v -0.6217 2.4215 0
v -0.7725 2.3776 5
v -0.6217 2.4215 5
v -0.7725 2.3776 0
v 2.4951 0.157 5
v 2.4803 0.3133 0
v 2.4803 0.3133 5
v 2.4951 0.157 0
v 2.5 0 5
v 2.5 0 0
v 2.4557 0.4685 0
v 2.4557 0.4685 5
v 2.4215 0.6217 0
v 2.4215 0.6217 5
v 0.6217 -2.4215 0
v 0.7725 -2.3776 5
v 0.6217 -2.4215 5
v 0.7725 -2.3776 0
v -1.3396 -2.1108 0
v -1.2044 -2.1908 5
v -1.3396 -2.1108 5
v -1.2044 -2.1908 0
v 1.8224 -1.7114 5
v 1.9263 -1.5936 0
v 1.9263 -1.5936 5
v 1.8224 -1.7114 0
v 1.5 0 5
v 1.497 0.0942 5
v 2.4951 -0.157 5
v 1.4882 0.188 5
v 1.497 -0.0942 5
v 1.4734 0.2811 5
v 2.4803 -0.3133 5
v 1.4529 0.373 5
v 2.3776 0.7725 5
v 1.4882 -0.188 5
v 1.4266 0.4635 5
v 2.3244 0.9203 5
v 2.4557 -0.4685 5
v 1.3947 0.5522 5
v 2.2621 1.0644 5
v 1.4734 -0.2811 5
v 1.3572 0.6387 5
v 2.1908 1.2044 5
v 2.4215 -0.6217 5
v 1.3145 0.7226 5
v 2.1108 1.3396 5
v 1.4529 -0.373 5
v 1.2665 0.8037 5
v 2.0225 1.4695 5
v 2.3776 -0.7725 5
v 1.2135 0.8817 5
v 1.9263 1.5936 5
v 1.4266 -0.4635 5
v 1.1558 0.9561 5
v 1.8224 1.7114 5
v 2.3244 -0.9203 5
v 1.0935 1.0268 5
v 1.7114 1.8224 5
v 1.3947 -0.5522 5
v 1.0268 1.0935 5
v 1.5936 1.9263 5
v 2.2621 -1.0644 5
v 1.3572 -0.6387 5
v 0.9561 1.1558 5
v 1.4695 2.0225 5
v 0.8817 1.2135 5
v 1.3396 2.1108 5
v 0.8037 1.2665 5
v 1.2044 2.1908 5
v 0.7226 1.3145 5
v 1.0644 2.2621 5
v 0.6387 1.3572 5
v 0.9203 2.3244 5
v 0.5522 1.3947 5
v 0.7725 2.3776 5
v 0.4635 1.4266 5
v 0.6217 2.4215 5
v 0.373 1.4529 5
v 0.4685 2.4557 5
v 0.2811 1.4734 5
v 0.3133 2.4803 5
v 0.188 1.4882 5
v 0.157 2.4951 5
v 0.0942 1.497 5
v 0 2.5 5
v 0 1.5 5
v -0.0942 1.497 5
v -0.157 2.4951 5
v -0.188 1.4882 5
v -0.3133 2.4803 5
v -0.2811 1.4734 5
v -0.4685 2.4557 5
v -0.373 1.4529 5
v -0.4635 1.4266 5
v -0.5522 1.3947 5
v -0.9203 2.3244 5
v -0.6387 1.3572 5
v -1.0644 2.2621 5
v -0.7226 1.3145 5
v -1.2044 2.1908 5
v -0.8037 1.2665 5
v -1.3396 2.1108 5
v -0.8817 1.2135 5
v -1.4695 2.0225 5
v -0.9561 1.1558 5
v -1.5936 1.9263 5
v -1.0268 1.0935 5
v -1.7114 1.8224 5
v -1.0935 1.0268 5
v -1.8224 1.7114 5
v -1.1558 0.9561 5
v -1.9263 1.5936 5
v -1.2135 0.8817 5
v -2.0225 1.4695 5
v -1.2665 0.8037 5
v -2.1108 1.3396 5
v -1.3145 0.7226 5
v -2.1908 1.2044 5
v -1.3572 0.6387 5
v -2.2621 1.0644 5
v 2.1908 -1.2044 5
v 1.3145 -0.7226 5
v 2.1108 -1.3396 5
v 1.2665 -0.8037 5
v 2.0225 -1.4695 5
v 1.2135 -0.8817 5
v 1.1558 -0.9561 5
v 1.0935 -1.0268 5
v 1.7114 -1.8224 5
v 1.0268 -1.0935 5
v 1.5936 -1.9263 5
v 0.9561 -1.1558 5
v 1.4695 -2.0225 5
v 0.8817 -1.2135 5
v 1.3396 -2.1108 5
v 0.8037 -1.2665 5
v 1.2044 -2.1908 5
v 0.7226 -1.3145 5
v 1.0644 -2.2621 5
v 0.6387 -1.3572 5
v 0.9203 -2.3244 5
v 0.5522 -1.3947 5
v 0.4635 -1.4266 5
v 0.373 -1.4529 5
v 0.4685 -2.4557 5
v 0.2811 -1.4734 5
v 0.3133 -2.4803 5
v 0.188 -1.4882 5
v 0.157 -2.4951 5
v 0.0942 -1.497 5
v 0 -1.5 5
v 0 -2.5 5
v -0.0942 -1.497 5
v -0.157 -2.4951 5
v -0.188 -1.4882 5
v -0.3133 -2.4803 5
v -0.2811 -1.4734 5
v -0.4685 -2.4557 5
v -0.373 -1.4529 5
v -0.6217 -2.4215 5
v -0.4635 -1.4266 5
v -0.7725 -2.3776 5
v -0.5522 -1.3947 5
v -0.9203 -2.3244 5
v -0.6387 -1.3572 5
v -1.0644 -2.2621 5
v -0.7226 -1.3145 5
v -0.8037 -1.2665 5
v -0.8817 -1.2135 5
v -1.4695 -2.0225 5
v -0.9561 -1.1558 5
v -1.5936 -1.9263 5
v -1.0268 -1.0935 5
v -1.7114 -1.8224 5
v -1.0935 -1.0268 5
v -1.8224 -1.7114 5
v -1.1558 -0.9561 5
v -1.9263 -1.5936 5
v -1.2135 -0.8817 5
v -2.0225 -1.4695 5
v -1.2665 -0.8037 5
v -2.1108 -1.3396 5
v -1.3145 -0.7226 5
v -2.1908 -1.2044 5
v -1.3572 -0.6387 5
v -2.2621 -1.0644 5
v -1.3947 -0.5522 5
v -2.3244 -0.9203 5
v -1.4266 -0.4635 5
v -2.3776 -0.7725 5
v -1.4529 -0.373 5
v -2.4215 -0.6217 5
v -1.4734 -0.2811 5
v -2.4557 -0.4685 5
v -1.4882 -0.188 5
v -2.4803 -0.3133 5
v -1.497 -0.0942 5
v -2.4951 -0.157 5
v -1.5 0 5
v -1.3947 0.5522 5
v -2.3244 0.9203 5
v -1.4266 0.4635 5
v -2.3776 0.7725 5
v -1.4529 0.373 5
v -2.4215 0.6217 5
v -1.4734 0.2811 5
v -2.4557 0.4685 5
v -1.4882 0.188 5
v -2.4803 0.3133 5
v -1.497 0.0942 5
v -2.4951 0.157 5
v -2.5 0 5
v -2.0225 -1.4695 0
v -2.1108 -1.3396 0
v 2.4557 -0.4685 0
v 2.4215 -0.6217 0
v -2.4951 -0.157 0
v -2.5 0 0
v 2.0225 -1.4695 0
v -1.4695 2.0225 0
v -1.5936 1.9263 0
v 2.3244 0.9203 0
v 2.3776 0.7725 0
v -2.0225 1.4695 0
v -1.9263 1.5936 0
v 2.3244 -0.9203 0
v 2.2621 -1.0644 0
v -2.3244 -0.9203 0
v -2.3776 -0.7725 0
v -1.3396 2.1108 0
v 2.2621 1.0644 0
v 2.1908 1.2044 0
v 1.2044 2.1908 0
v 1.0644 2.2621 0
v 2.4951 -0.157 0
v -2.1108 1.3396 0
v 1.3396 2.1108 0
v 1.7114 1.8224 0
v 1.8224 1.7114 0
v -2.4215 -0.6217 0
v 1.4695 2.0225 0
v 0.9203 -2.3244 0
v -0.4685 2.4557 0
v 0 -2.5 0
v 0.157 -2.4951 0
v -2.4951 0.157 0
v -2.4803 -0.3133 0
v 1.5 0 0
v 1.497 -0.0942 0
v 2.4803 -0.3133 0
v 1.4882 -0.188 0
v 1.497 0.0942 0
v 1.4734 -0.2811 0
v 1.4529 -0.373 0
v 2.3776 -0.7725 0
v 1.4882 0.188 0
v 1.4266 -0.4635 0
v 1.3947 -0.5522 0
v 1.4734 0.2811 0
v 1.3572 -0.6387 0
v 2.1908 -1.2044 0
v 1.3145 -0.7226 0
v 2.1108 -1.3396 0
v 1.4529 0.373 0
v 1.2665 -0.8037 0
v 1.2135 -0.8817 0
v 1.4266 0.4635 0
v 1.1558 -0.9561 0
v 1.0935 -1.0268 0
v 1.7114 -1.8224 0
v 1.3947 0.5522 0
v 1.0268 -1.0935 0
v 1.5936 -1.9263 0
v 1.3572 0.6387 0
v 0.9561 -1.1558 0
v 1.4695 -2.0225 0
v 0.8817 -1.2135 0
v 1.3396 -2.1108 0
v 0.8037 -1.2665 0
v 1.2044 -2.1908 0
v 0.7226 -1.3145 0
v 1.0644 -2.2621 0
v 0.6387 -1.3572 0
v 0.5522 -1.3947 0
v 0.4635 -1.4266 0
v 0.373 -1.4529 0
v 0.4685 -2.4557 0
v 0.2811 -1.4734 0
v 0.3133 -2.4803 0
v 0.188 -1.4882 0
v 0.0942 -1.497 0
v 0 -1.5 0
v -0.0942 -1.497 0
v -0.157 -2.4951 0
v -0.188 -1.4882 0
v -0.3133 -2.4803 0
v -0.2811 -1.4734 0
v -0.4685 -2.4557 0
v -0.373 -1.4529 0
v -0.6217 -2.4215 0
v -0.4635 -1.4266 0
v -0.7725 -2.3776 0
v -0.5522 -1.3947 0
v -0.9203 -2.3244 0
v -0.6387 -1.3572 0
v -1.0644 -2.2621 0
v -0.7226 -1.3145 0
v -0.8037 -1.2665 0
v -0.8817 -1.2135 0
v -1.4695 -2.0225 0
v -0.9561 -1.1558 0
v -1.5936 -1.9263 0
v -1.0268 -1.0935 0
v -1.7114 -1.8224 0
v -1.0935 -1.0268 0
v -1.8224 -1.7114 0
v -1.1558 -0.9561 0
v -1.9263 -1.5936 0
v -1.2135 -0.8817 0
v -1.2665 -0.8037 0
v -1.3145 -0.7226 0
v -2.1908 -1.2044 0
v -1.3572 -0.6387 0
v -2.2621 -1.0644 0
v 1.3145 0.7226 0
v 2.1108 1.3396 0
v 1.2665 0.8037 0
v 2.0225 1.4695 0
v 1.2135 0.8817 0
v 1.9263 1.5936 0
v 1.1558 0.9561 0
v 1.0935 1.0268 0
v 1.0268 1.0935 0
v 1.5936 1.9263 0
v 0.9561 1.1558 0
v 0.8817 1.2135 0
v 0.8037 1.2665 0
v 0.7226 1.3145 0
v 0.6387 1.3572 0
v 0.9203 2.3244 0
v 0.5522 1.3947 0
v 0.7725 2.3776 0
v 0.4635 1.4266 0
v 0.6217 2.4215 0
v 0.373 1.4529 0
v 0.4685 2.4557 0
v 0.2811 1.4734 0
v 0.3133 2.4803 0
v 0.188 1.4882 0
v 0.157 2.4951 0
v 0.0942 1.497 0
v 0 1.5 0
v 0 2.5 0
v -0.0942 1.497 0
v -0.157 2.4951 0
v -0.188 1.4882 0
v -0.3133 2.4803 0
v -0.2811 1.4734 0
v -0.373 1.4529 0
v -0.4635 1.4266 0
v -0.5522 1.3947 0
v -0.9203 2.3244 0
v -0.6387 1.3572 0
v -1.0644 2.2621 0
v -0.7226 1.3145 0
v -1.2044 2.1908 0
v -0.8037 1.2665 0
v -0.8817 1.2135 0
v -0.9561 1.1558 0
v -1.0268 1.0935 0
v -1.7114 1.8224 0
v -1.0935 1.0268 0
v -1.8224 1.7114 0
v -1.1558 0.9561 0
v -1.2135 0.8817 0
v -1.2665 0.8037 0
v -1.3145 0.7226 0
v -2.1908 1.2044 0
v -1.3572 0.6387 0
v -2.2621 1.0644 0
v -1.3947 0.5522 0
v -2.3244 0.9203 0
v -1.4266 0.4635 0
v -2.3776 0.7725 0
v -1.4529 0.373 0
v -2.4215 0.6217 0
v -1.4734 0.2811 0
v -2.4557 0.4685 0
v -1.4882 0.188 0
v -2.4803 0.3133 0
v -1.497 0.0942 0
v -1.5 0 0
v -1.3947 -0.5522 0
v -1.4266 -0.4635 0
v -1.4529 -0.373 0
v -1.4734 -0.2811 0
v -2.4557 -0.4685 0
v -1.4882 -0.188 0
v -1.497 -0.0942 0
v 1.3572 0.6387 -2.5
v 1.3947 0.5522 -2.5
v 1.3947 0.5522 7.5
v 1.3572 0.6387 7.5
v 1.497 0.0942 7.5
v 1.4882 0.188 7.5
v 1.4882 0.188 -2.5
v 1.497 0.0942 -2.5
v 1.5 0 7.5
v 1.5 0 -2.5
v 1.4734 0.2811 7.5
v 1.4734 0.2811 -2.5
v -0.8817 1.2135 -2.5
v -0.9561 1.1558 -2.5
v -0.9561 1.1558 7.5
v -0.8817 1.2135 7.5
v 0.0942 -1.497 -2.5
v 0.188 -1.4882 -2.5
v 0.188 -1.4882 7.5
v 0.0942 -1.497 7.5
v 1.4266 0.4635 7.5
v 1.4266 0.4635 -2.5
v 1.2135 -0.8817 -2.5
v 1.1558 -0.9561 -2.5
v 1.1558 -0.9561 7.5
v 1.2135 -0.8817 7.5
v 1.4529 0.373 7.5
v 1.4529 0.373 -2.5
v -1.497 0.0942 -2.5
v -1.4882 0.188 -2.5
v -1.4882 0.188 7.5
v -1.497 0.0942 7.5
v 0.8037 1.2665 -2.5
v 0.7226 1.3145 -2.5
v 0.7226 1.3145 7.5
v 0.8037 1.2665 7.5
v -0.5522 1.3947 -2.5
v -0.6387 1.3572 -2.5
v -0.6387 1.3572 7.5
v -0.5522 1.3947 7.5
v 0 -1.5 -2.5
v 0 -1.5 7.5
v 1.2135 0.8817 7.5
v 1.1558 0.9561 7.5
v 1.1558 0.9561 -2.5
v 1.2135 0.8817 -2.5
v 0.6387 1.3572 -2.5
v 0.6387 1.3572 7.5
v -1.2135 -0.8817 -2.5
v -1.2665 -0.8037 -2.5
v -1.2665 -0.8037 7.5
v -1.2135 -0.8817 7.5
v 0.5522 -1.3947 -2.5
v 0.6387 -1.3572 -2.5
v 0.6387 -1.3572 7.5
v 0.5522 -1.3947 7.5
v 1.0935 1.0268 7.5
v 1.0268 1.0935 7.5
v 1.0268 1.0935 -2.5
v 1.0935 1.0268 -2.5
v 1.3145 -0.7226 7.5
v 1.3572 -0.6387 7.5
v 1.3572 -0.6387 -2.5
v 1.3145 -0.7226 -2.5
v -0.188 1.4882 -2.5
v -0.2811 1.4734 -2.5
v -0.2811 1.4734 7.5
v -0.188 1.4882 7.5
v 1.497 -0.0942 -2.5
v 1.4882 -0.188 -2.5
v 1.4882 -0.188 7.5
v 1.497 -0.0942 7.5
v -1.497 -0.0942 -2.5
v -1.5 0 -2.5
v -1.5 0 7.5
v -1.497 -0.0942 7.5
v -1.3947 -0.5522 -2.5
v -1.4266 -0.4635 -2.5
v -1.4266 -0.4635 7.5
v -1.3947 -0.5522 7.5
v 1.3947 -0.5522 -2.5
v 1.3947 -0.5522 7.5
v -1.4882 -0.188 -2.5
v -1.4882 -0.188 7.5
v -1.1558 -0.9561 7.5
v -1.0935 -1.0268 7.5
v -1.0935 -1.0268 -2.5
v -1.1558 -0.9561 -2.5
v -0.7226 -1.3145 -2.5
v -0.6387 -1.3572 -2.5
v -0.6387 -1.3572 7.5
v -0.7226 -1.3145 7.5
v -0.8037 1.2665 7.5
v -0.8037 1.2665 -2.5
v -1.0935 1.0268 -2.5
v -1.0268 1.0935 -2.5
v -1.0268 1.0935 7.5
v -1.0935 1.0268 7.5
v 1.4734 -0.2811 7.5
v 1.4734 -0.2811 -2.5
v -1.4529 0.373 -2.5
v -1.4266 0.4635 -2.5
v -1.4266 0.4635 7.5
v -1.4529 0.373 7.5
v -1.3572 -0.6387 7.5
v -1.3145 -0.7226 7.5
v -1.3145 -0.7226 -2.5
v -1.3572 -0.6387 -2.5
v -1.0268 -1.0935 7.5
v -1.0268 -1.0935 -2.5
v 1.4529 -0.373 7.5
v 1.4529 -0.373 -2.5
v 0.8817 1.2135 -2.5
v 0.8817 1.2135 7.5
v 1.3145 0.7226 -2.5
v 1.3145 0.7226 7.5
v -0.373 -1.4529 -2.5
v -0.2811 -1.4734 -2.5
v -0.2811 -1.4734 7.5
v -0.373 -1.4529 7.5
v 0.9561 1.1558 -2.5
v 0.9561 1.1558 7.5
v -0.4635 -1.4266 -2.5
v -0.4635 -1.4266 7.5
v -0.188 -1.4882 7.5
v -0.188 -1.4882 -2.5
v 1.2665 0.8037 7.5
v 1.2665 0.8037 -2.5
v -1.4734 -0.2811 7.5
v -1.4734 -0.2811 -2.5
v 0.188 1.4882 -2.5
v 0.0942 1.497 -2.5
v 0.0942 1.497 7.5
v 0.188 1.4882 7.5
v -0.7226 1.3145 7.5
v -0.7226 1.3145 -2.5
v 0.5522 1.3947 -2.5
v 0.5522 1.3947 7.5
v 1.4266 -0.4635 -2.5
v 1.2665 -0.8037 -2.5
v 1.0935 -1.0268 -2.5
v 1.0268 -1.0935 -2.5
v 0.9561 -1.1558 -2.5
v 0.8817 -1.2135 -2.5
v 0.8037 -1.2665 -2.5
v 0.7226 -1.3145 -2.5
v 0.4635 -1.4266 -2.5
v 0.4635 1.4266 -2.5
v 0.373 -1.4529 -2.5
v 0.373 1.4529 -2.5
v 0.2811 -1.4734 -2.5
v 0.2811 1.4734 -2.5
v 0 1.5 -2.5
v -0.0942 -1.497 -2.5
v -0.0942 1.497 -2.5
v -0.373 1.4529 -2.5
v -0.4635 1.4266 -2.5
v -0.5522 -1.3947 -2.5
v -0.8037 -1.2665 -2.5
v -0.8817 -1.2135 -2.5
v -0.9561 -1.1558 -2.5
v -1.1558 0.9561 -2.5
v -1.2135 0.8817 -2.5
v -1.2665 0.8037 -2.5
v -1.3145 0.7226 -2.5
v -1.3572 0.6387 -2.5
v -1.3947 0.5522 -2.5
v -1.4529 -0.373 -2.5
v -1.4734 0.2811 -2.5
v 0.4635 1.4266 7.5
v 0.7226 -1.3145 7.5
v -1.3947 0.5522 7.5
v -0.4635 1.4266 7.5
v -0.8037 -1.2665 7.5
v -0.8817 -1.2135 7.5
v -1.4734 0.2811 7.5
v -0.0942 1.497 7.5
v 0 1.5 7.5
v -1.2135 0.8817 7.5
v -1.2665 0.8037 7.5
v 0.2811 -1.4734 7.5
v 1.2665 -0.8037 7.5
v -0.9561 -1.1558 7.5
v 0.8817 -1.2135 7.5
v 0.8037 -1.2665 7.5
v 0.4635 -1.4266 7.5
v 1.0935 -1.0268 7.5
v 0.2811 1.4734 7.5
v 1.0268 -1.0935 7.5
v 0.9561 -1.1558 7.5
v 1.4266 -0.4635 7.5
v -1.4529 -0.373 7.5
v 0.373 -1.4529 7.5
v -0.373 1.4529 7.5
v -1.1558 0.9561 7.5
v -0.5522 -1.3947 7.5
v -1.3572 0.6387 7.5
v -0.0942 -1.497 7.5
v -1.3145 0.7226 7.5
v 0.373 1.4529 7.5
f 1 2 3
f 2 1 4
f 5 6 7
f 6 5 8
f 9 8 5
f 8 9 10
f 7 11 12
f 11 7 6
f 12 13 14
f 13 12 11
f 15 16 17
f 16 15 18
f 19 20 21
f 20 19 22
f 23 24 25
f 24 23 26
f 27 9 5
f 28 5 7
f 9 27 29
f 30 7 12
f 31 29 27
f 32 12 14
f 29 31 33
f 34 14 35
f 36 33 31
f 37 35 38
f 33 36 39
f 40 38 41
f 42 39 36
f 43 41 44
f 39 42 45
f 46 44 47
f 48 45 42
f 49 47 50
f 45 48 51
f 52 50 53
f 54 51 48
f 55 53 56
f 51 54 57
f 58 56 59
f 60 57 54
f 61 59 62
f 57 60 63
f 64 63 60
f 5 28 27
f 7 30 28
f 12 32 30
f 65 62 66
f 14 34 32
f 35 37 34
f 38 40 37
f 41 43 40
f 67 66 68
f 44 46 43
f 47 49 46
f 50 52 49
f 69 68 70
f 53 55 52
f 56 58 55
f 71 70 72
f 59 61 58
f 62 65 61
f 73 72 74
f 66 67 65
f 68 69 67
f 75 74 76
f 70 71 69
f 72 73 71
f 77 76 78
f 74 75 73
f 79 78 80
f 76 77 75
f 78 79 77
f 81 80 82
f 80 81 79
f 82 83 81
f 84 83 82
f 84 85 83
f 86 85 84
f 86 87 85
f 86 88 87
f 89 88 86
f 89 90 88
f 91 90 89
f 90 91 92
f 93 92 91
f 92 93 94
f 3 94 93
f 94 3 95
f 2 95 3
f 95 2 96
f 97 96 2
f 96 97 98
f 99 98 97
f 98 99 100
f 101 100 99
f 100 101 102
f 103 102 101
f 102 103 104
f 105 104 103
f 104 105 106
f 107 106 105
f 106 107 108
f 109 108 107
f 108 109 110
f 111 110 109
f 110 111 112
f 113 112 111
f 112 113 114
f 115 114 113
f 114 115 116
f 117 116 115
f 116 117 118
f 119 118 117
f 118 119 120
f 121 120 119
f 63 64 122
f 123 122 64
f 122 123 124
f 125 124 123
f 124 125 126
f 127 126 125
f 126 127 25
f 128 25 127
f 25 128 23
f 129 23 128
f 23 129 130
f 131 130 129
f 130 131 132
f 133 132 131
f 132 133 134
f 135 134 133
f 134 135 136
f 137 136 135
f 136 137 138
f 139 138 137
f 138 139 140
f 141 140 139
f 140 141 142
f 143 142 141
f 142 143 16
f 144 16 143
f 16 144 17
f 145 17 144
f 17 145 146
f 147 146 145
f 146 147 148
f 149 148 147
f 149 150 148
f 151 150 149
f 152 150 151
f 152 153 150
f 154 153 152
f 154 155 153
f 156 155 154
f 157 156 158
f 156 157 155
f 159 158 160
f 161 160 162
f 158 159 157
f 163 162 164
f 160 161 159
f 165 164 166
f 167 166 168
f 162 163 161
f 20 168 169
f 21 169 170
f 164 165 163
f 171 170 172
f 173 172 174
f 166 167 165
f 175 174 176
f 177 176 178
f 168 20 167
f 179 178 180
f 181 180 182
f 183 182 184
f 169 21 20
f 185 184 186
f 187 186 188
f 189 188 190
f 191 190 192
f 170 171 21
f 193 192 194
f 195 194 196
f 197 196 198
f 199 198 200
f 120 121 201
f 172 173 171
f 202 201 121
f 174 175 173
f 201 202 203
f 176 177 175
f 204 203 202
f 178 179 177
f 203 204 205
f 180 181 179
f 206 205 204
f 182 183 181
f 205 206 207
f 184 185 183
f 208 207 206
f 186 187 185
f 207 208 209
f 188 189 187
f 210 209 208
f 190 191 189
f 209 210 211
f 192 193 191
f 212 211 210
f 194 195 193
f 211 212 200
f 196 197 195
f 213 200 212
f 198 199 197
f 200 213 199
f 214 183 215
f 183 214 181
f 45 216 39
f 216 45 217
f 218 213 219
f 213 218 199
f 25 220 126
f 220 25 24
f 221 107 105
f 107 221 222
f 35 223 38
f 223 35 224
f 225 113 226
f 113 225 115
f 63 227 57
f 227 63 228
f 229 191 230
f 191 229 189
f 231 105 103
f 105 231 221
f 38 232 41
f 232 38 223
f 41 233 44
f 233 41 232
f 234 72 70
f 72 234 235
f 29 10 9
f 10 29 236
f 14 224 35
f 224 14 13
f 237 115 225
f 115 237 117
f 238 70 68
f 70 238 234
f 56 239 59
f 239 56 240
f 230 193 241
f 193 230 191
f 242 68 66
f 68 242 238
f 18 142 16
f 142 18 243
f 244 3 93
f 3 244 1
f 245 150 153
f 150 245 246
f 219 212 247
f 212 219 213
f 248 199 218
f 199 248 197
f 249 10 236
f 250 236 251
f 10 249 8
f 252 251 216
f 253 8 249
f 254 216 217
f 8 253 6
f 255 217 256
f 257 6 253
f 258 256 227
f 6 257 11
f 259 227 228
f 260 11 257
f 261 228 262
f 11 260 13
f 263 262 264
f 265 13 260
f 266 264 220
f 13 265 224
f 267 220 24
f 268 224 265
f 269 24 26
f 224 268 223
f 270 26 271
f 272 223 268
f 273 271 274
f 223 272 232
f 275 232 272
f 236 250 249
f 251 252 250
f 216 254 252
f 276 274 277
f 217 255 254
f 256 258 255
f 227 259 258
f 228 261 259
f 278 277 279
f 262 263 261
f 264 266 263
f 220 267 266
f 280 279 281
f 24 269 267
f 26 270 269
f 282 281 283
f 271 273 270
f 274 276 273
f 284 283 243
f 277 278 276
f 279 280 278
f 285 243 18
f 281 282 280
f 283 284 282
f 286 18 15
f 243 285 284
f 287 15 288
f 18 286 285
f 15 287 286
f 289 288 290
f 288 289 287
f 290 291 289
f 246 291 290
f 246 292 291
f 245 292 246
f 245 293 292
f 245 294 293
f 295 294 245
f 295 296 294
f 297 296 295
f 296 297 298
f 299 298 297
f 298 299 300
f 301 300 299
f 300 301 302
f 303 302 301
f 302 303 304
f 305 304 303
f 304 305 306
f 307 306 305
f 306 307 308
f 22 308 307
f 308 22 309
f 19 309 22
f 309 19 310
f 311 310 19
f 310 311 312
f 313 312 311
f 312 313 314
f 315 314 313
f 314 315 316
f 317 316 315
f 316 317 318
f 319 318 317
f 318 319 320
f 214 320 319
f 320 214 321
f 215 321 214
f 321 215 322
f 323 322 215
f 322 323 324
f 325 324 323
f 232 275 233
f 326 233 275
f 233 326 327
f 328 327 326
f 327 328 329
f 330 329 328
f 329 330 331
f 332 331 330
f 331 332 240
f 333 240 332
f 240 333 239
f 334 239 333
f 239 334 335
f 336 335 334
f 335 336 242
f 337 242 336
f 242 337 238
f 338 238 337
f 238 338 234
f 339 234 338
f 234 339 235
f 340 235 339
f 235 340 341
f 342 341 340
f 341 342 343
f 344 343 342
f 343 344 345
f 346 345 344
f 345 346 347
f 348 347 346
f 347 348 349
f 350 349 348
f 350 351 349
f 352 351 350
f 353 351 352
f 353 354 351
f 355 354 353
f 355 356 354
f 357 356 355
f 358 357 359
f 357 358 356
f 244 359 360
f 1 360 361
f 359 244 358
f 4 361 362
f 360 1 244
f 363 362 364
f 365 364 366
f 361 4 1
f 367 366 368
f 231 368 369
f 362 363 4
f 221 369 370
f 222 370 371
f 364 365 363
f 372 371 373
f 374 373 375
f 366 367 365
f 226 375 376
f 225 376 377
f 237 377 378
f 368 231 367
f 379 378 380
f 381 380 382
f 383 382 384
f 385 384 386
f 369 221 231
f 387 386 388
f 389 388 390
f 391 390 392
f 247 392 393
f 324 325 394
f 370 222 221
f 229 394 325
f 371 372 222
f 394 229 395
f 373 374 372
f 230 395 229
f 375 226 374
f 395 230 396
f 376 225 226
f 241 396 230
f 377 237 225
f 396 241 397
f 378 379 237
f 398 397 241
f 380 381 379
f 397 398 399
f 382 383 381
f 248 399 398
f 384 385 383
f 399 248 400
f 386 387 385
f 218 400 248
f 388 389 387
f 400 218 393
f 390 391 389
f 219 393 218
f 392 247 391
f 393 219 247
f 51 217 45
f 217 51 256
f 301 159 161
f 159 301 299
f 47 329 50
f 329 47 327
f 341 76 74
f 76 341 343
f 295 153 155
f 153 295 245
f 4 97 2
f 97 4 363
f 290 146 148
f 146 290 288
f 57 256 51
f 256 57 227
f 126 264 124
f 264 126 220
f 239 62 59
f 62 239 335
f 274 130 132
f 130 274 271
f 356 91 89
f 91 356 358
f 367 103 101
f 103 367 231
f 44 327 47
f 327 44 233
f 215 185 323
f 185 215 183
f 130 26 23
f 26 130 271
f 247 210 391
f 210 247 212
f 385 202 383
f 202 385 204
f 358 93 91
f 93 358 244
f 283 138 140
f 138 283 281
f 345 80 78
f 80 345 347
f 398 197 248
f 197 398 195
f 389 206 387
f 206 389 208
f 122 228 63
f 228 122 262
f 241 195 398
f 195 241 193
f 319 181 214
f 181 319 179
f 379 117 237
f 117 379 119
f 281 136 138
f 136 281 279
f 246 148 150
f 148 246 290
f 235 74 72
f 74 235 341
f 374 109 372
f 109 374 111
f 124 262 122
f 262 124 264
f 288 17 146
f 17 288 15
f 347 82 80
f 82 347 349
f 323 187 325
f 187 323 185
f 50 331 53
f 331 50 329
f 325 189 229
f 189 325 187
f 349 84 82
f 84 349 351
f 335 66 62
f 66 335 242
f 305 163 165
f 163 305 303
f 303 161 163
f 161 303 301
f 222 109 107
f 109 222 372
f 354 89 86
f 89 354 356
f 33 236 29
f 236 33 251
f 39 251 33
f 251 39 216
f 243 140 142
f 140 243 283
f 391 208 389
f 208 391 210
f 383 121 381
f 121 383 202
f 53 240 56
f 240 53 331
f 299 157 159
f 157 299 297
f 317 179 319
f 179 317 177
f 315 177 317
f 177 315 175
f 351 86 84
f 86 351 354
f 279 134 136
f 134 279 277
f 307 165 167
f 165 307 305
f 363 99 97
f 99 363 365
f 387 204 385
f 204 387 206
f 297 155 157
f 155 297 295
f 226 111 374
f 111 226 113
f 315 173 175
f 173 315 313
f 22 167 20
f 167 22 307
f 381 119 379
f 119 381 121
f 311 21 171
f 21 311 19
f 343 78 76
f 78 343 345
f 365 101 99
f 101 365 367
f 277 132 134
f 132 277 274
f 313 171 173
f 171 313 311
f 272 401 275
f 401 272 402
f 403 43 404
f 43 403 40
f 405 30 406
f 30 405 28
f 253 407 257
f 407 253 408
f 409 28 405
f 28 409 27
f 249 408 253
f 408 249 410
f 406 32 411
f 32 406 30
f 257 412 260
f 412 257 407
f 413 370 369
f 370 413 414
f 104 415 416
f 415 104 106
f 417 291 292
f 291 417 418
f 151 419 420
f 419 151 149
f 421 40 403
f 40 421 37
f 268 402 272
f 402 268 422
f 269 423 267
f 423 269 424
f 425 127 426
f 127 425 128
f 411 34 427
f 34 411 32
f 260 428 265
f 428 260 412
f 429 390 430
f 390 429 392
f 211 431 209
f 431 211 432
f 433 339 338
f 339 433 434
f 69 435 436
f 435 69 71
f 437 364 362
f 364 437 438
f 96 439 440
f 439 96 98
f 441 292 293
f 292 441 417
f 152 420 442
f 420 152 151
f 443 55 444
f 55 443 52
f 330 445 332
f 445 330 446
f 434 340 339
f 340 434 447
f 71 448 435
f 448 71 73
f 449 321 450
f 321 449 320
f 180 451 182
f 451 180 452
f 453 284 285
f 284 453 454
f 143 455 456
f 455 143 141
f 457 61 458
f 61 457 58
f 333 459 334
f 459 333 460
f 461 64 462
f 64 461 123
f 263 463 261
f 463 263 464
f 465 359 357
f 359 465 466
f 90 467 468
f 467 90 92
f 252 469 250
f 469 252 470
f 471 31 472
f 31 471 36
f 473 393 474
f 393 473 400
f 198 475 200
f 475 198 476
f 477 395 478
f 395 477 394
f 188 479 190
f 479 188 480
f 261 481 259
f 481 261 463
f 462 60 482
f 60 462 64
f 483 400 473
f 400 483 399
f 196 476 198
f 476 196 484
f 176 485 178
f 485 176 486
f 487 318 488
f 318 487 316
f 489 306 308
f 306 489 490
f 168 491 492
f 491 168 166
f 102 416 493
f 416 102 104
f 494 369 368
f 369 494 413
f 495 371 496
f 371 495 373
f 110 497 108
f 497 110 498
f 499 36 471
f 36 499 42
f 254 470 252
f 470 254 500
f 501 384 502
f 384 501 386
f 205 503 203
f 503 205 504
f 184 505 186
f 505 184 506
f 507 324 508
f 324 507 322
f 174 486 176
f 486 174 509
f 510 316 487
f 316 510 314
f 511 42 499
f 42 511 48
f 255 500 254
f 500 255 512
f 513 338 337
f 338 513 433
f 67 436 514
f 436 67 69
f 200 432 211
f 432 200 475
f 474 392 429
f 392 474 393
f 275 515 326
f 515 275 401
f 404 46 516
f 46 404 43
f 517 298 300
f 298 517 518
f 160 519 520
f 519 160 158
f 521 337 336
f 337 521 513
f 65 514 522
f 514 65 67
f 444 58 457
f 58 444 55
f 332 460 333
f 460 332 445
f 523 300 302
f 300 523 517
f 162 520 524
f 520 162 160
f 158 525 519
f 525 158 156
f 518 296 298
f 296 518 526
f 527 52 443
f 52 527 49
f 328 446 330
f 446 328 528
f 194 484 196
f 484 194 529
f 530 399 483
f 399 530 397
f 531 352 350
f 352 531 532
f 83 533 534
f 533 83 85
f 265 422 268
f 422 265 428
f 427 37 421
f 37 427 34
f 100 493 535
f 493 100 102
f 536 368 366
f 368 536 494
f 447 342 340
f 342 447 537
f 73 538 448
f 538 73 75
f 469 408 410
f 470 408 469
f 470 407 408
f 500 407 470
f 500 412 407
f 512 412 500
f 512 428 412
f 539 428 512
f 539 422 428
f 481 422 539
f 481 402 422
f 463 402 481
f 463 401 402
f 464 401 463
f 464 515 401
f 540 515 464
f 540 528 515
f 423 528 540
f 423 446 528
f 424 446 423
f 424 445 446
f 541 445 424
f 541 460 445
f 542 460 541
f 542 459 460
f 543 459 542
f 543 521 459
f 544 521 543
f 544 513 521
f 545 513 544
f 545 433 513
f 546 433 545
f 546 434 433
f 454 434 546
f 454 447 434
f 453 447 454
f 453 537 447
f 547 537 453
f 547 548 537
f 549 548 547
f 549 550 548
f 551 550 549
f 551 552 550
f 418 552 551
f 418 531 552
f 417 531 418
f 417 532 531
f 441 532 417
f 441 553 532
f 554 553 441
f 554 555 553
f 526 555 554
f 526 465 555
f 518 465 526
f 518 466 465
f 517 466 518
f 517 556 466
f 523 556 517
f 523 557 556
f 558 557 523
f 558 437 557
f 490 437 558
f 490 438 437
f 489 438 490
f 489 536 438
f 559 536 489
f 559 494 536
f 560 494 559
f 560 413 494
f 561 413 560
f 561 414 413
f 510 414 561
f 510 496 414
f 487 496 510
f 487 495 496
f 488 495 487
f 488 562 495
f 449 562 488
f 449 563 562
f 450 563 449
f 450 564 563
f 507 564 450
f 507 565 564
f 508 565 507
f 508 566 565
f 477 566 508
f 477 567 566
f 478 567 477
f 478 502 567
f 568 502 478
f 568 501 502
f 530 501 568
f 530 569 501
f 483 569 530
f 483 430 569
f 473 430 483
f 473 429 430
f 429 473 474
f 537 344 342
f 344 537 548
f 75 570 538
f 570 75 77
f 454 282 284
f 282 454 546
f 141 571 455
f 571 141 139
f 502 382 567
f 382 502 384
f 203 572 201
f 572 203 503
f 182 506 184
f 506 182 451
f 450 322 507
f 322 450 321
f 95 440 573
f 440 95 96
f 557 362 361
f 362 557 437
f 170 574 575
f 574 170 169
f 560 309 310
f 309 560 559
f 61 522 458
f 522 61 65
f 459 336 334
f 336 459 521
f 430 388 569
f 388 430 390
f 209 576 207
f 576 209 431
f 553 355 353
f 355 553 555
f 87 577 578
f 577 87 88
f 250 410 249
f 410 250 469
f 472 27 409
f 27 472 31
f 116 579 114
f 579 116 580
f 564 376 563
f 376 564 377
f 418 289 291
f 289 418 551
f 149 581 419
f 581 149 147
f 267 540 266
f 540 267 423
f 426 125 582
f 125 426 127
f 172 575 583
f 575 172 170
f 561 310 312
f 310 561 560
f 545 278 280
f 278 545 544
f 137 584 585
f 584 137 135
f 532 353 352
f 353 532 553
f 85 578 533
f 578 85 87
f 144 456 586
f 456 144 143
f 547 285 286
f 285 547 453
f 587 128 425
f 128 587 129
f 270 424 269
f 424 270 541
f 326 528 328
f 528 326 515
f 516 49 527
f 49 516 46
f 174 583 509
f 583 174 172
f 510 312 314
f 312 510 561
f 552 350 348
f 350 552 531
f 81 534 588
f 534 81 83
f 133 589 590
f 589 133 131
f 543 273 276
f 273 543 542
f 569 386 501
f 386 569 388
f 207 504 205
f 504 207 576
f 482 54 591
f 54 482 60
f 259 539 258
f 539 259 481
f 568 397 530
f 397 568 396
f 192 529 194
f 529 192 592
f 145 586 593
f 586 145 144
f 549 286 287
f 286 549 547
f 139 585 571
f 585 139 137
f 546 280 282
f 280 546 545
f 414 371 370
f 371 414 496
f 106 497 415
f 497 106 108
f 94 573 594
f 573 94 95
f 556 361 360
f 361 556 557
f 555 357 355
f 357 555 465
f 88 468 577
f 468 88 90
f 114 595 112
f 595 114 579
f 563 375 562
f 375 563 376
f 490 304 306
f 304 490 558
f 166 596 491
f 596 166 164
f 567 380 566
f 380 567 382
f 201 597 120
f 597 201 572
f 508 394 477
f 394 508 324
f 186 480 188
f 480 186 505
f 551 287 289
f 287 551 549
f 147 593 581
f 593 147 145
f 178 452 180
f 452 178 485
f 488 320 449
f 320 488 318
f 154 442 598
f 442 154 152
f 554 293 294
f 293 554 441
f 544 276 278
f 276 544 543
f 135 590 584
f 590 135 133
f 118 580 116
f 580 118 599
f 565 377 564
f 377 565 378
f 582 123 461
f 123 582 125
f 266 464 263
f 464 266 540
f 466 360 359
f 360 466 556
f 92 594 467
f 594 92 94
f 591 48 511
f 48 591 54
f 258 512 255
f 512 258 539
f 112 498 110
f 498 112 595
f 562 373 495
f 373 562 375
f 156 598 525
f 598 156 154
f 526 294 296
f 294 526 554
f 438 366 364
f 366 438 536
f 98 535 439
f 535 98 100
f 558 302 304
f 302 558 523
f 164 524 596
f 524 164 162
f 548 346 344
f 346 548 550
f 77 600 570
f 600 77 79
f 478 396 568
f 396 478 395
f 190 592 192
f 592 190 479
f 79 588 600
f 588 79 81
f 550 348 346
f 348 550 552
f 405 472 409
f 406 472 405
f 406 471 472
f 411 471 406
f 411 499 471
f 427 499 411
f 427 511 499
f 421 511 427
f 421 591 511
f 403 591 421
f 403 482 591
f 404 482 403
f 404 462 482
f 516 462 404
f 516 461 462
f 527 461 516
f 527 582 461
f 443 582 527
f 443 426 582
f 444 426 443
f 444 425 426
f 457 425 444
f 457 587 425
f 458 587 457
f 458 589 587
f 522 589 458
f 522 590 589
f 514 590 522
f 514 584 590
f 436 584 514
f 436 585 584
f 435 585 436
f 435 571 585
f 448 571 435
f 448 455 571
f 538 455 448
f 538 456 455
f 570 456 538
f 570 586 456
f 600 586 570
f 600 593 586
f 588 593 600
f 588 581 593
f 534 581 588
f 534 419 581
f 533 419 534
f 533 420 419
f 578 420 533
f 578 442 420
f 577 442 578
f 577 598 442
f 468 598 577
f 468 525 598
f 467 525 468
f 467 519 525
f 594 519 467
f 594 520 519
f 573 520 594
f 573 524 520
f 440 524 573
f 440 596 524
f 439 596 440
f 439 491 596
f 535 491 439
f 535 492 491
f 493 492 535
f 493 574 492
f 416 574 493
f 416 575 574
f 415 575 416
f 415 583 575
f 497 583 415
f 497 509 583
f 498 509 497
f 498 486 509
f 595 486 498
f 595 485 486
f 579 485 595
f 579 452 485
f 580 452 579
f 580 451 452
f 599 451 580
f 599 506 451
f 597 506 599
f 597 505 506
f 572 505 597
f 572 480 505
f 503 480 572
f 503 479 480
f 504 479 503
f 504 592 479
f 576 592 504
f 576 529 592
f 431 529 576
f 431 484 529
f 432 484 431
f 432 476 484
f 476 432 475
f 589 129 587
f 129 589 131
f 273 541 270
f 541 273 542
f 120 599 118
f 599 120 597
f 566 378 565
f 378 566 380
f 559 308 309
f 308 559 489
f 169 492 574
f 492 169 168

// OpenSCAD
union() {
    cylinder(h = 5.0, r = 2.5, $fn=100);
    translate([0.0, 0.0, -2.5]) {
    cylinder(h = 10.0, r = 1.5, $fn=100);
}
}
